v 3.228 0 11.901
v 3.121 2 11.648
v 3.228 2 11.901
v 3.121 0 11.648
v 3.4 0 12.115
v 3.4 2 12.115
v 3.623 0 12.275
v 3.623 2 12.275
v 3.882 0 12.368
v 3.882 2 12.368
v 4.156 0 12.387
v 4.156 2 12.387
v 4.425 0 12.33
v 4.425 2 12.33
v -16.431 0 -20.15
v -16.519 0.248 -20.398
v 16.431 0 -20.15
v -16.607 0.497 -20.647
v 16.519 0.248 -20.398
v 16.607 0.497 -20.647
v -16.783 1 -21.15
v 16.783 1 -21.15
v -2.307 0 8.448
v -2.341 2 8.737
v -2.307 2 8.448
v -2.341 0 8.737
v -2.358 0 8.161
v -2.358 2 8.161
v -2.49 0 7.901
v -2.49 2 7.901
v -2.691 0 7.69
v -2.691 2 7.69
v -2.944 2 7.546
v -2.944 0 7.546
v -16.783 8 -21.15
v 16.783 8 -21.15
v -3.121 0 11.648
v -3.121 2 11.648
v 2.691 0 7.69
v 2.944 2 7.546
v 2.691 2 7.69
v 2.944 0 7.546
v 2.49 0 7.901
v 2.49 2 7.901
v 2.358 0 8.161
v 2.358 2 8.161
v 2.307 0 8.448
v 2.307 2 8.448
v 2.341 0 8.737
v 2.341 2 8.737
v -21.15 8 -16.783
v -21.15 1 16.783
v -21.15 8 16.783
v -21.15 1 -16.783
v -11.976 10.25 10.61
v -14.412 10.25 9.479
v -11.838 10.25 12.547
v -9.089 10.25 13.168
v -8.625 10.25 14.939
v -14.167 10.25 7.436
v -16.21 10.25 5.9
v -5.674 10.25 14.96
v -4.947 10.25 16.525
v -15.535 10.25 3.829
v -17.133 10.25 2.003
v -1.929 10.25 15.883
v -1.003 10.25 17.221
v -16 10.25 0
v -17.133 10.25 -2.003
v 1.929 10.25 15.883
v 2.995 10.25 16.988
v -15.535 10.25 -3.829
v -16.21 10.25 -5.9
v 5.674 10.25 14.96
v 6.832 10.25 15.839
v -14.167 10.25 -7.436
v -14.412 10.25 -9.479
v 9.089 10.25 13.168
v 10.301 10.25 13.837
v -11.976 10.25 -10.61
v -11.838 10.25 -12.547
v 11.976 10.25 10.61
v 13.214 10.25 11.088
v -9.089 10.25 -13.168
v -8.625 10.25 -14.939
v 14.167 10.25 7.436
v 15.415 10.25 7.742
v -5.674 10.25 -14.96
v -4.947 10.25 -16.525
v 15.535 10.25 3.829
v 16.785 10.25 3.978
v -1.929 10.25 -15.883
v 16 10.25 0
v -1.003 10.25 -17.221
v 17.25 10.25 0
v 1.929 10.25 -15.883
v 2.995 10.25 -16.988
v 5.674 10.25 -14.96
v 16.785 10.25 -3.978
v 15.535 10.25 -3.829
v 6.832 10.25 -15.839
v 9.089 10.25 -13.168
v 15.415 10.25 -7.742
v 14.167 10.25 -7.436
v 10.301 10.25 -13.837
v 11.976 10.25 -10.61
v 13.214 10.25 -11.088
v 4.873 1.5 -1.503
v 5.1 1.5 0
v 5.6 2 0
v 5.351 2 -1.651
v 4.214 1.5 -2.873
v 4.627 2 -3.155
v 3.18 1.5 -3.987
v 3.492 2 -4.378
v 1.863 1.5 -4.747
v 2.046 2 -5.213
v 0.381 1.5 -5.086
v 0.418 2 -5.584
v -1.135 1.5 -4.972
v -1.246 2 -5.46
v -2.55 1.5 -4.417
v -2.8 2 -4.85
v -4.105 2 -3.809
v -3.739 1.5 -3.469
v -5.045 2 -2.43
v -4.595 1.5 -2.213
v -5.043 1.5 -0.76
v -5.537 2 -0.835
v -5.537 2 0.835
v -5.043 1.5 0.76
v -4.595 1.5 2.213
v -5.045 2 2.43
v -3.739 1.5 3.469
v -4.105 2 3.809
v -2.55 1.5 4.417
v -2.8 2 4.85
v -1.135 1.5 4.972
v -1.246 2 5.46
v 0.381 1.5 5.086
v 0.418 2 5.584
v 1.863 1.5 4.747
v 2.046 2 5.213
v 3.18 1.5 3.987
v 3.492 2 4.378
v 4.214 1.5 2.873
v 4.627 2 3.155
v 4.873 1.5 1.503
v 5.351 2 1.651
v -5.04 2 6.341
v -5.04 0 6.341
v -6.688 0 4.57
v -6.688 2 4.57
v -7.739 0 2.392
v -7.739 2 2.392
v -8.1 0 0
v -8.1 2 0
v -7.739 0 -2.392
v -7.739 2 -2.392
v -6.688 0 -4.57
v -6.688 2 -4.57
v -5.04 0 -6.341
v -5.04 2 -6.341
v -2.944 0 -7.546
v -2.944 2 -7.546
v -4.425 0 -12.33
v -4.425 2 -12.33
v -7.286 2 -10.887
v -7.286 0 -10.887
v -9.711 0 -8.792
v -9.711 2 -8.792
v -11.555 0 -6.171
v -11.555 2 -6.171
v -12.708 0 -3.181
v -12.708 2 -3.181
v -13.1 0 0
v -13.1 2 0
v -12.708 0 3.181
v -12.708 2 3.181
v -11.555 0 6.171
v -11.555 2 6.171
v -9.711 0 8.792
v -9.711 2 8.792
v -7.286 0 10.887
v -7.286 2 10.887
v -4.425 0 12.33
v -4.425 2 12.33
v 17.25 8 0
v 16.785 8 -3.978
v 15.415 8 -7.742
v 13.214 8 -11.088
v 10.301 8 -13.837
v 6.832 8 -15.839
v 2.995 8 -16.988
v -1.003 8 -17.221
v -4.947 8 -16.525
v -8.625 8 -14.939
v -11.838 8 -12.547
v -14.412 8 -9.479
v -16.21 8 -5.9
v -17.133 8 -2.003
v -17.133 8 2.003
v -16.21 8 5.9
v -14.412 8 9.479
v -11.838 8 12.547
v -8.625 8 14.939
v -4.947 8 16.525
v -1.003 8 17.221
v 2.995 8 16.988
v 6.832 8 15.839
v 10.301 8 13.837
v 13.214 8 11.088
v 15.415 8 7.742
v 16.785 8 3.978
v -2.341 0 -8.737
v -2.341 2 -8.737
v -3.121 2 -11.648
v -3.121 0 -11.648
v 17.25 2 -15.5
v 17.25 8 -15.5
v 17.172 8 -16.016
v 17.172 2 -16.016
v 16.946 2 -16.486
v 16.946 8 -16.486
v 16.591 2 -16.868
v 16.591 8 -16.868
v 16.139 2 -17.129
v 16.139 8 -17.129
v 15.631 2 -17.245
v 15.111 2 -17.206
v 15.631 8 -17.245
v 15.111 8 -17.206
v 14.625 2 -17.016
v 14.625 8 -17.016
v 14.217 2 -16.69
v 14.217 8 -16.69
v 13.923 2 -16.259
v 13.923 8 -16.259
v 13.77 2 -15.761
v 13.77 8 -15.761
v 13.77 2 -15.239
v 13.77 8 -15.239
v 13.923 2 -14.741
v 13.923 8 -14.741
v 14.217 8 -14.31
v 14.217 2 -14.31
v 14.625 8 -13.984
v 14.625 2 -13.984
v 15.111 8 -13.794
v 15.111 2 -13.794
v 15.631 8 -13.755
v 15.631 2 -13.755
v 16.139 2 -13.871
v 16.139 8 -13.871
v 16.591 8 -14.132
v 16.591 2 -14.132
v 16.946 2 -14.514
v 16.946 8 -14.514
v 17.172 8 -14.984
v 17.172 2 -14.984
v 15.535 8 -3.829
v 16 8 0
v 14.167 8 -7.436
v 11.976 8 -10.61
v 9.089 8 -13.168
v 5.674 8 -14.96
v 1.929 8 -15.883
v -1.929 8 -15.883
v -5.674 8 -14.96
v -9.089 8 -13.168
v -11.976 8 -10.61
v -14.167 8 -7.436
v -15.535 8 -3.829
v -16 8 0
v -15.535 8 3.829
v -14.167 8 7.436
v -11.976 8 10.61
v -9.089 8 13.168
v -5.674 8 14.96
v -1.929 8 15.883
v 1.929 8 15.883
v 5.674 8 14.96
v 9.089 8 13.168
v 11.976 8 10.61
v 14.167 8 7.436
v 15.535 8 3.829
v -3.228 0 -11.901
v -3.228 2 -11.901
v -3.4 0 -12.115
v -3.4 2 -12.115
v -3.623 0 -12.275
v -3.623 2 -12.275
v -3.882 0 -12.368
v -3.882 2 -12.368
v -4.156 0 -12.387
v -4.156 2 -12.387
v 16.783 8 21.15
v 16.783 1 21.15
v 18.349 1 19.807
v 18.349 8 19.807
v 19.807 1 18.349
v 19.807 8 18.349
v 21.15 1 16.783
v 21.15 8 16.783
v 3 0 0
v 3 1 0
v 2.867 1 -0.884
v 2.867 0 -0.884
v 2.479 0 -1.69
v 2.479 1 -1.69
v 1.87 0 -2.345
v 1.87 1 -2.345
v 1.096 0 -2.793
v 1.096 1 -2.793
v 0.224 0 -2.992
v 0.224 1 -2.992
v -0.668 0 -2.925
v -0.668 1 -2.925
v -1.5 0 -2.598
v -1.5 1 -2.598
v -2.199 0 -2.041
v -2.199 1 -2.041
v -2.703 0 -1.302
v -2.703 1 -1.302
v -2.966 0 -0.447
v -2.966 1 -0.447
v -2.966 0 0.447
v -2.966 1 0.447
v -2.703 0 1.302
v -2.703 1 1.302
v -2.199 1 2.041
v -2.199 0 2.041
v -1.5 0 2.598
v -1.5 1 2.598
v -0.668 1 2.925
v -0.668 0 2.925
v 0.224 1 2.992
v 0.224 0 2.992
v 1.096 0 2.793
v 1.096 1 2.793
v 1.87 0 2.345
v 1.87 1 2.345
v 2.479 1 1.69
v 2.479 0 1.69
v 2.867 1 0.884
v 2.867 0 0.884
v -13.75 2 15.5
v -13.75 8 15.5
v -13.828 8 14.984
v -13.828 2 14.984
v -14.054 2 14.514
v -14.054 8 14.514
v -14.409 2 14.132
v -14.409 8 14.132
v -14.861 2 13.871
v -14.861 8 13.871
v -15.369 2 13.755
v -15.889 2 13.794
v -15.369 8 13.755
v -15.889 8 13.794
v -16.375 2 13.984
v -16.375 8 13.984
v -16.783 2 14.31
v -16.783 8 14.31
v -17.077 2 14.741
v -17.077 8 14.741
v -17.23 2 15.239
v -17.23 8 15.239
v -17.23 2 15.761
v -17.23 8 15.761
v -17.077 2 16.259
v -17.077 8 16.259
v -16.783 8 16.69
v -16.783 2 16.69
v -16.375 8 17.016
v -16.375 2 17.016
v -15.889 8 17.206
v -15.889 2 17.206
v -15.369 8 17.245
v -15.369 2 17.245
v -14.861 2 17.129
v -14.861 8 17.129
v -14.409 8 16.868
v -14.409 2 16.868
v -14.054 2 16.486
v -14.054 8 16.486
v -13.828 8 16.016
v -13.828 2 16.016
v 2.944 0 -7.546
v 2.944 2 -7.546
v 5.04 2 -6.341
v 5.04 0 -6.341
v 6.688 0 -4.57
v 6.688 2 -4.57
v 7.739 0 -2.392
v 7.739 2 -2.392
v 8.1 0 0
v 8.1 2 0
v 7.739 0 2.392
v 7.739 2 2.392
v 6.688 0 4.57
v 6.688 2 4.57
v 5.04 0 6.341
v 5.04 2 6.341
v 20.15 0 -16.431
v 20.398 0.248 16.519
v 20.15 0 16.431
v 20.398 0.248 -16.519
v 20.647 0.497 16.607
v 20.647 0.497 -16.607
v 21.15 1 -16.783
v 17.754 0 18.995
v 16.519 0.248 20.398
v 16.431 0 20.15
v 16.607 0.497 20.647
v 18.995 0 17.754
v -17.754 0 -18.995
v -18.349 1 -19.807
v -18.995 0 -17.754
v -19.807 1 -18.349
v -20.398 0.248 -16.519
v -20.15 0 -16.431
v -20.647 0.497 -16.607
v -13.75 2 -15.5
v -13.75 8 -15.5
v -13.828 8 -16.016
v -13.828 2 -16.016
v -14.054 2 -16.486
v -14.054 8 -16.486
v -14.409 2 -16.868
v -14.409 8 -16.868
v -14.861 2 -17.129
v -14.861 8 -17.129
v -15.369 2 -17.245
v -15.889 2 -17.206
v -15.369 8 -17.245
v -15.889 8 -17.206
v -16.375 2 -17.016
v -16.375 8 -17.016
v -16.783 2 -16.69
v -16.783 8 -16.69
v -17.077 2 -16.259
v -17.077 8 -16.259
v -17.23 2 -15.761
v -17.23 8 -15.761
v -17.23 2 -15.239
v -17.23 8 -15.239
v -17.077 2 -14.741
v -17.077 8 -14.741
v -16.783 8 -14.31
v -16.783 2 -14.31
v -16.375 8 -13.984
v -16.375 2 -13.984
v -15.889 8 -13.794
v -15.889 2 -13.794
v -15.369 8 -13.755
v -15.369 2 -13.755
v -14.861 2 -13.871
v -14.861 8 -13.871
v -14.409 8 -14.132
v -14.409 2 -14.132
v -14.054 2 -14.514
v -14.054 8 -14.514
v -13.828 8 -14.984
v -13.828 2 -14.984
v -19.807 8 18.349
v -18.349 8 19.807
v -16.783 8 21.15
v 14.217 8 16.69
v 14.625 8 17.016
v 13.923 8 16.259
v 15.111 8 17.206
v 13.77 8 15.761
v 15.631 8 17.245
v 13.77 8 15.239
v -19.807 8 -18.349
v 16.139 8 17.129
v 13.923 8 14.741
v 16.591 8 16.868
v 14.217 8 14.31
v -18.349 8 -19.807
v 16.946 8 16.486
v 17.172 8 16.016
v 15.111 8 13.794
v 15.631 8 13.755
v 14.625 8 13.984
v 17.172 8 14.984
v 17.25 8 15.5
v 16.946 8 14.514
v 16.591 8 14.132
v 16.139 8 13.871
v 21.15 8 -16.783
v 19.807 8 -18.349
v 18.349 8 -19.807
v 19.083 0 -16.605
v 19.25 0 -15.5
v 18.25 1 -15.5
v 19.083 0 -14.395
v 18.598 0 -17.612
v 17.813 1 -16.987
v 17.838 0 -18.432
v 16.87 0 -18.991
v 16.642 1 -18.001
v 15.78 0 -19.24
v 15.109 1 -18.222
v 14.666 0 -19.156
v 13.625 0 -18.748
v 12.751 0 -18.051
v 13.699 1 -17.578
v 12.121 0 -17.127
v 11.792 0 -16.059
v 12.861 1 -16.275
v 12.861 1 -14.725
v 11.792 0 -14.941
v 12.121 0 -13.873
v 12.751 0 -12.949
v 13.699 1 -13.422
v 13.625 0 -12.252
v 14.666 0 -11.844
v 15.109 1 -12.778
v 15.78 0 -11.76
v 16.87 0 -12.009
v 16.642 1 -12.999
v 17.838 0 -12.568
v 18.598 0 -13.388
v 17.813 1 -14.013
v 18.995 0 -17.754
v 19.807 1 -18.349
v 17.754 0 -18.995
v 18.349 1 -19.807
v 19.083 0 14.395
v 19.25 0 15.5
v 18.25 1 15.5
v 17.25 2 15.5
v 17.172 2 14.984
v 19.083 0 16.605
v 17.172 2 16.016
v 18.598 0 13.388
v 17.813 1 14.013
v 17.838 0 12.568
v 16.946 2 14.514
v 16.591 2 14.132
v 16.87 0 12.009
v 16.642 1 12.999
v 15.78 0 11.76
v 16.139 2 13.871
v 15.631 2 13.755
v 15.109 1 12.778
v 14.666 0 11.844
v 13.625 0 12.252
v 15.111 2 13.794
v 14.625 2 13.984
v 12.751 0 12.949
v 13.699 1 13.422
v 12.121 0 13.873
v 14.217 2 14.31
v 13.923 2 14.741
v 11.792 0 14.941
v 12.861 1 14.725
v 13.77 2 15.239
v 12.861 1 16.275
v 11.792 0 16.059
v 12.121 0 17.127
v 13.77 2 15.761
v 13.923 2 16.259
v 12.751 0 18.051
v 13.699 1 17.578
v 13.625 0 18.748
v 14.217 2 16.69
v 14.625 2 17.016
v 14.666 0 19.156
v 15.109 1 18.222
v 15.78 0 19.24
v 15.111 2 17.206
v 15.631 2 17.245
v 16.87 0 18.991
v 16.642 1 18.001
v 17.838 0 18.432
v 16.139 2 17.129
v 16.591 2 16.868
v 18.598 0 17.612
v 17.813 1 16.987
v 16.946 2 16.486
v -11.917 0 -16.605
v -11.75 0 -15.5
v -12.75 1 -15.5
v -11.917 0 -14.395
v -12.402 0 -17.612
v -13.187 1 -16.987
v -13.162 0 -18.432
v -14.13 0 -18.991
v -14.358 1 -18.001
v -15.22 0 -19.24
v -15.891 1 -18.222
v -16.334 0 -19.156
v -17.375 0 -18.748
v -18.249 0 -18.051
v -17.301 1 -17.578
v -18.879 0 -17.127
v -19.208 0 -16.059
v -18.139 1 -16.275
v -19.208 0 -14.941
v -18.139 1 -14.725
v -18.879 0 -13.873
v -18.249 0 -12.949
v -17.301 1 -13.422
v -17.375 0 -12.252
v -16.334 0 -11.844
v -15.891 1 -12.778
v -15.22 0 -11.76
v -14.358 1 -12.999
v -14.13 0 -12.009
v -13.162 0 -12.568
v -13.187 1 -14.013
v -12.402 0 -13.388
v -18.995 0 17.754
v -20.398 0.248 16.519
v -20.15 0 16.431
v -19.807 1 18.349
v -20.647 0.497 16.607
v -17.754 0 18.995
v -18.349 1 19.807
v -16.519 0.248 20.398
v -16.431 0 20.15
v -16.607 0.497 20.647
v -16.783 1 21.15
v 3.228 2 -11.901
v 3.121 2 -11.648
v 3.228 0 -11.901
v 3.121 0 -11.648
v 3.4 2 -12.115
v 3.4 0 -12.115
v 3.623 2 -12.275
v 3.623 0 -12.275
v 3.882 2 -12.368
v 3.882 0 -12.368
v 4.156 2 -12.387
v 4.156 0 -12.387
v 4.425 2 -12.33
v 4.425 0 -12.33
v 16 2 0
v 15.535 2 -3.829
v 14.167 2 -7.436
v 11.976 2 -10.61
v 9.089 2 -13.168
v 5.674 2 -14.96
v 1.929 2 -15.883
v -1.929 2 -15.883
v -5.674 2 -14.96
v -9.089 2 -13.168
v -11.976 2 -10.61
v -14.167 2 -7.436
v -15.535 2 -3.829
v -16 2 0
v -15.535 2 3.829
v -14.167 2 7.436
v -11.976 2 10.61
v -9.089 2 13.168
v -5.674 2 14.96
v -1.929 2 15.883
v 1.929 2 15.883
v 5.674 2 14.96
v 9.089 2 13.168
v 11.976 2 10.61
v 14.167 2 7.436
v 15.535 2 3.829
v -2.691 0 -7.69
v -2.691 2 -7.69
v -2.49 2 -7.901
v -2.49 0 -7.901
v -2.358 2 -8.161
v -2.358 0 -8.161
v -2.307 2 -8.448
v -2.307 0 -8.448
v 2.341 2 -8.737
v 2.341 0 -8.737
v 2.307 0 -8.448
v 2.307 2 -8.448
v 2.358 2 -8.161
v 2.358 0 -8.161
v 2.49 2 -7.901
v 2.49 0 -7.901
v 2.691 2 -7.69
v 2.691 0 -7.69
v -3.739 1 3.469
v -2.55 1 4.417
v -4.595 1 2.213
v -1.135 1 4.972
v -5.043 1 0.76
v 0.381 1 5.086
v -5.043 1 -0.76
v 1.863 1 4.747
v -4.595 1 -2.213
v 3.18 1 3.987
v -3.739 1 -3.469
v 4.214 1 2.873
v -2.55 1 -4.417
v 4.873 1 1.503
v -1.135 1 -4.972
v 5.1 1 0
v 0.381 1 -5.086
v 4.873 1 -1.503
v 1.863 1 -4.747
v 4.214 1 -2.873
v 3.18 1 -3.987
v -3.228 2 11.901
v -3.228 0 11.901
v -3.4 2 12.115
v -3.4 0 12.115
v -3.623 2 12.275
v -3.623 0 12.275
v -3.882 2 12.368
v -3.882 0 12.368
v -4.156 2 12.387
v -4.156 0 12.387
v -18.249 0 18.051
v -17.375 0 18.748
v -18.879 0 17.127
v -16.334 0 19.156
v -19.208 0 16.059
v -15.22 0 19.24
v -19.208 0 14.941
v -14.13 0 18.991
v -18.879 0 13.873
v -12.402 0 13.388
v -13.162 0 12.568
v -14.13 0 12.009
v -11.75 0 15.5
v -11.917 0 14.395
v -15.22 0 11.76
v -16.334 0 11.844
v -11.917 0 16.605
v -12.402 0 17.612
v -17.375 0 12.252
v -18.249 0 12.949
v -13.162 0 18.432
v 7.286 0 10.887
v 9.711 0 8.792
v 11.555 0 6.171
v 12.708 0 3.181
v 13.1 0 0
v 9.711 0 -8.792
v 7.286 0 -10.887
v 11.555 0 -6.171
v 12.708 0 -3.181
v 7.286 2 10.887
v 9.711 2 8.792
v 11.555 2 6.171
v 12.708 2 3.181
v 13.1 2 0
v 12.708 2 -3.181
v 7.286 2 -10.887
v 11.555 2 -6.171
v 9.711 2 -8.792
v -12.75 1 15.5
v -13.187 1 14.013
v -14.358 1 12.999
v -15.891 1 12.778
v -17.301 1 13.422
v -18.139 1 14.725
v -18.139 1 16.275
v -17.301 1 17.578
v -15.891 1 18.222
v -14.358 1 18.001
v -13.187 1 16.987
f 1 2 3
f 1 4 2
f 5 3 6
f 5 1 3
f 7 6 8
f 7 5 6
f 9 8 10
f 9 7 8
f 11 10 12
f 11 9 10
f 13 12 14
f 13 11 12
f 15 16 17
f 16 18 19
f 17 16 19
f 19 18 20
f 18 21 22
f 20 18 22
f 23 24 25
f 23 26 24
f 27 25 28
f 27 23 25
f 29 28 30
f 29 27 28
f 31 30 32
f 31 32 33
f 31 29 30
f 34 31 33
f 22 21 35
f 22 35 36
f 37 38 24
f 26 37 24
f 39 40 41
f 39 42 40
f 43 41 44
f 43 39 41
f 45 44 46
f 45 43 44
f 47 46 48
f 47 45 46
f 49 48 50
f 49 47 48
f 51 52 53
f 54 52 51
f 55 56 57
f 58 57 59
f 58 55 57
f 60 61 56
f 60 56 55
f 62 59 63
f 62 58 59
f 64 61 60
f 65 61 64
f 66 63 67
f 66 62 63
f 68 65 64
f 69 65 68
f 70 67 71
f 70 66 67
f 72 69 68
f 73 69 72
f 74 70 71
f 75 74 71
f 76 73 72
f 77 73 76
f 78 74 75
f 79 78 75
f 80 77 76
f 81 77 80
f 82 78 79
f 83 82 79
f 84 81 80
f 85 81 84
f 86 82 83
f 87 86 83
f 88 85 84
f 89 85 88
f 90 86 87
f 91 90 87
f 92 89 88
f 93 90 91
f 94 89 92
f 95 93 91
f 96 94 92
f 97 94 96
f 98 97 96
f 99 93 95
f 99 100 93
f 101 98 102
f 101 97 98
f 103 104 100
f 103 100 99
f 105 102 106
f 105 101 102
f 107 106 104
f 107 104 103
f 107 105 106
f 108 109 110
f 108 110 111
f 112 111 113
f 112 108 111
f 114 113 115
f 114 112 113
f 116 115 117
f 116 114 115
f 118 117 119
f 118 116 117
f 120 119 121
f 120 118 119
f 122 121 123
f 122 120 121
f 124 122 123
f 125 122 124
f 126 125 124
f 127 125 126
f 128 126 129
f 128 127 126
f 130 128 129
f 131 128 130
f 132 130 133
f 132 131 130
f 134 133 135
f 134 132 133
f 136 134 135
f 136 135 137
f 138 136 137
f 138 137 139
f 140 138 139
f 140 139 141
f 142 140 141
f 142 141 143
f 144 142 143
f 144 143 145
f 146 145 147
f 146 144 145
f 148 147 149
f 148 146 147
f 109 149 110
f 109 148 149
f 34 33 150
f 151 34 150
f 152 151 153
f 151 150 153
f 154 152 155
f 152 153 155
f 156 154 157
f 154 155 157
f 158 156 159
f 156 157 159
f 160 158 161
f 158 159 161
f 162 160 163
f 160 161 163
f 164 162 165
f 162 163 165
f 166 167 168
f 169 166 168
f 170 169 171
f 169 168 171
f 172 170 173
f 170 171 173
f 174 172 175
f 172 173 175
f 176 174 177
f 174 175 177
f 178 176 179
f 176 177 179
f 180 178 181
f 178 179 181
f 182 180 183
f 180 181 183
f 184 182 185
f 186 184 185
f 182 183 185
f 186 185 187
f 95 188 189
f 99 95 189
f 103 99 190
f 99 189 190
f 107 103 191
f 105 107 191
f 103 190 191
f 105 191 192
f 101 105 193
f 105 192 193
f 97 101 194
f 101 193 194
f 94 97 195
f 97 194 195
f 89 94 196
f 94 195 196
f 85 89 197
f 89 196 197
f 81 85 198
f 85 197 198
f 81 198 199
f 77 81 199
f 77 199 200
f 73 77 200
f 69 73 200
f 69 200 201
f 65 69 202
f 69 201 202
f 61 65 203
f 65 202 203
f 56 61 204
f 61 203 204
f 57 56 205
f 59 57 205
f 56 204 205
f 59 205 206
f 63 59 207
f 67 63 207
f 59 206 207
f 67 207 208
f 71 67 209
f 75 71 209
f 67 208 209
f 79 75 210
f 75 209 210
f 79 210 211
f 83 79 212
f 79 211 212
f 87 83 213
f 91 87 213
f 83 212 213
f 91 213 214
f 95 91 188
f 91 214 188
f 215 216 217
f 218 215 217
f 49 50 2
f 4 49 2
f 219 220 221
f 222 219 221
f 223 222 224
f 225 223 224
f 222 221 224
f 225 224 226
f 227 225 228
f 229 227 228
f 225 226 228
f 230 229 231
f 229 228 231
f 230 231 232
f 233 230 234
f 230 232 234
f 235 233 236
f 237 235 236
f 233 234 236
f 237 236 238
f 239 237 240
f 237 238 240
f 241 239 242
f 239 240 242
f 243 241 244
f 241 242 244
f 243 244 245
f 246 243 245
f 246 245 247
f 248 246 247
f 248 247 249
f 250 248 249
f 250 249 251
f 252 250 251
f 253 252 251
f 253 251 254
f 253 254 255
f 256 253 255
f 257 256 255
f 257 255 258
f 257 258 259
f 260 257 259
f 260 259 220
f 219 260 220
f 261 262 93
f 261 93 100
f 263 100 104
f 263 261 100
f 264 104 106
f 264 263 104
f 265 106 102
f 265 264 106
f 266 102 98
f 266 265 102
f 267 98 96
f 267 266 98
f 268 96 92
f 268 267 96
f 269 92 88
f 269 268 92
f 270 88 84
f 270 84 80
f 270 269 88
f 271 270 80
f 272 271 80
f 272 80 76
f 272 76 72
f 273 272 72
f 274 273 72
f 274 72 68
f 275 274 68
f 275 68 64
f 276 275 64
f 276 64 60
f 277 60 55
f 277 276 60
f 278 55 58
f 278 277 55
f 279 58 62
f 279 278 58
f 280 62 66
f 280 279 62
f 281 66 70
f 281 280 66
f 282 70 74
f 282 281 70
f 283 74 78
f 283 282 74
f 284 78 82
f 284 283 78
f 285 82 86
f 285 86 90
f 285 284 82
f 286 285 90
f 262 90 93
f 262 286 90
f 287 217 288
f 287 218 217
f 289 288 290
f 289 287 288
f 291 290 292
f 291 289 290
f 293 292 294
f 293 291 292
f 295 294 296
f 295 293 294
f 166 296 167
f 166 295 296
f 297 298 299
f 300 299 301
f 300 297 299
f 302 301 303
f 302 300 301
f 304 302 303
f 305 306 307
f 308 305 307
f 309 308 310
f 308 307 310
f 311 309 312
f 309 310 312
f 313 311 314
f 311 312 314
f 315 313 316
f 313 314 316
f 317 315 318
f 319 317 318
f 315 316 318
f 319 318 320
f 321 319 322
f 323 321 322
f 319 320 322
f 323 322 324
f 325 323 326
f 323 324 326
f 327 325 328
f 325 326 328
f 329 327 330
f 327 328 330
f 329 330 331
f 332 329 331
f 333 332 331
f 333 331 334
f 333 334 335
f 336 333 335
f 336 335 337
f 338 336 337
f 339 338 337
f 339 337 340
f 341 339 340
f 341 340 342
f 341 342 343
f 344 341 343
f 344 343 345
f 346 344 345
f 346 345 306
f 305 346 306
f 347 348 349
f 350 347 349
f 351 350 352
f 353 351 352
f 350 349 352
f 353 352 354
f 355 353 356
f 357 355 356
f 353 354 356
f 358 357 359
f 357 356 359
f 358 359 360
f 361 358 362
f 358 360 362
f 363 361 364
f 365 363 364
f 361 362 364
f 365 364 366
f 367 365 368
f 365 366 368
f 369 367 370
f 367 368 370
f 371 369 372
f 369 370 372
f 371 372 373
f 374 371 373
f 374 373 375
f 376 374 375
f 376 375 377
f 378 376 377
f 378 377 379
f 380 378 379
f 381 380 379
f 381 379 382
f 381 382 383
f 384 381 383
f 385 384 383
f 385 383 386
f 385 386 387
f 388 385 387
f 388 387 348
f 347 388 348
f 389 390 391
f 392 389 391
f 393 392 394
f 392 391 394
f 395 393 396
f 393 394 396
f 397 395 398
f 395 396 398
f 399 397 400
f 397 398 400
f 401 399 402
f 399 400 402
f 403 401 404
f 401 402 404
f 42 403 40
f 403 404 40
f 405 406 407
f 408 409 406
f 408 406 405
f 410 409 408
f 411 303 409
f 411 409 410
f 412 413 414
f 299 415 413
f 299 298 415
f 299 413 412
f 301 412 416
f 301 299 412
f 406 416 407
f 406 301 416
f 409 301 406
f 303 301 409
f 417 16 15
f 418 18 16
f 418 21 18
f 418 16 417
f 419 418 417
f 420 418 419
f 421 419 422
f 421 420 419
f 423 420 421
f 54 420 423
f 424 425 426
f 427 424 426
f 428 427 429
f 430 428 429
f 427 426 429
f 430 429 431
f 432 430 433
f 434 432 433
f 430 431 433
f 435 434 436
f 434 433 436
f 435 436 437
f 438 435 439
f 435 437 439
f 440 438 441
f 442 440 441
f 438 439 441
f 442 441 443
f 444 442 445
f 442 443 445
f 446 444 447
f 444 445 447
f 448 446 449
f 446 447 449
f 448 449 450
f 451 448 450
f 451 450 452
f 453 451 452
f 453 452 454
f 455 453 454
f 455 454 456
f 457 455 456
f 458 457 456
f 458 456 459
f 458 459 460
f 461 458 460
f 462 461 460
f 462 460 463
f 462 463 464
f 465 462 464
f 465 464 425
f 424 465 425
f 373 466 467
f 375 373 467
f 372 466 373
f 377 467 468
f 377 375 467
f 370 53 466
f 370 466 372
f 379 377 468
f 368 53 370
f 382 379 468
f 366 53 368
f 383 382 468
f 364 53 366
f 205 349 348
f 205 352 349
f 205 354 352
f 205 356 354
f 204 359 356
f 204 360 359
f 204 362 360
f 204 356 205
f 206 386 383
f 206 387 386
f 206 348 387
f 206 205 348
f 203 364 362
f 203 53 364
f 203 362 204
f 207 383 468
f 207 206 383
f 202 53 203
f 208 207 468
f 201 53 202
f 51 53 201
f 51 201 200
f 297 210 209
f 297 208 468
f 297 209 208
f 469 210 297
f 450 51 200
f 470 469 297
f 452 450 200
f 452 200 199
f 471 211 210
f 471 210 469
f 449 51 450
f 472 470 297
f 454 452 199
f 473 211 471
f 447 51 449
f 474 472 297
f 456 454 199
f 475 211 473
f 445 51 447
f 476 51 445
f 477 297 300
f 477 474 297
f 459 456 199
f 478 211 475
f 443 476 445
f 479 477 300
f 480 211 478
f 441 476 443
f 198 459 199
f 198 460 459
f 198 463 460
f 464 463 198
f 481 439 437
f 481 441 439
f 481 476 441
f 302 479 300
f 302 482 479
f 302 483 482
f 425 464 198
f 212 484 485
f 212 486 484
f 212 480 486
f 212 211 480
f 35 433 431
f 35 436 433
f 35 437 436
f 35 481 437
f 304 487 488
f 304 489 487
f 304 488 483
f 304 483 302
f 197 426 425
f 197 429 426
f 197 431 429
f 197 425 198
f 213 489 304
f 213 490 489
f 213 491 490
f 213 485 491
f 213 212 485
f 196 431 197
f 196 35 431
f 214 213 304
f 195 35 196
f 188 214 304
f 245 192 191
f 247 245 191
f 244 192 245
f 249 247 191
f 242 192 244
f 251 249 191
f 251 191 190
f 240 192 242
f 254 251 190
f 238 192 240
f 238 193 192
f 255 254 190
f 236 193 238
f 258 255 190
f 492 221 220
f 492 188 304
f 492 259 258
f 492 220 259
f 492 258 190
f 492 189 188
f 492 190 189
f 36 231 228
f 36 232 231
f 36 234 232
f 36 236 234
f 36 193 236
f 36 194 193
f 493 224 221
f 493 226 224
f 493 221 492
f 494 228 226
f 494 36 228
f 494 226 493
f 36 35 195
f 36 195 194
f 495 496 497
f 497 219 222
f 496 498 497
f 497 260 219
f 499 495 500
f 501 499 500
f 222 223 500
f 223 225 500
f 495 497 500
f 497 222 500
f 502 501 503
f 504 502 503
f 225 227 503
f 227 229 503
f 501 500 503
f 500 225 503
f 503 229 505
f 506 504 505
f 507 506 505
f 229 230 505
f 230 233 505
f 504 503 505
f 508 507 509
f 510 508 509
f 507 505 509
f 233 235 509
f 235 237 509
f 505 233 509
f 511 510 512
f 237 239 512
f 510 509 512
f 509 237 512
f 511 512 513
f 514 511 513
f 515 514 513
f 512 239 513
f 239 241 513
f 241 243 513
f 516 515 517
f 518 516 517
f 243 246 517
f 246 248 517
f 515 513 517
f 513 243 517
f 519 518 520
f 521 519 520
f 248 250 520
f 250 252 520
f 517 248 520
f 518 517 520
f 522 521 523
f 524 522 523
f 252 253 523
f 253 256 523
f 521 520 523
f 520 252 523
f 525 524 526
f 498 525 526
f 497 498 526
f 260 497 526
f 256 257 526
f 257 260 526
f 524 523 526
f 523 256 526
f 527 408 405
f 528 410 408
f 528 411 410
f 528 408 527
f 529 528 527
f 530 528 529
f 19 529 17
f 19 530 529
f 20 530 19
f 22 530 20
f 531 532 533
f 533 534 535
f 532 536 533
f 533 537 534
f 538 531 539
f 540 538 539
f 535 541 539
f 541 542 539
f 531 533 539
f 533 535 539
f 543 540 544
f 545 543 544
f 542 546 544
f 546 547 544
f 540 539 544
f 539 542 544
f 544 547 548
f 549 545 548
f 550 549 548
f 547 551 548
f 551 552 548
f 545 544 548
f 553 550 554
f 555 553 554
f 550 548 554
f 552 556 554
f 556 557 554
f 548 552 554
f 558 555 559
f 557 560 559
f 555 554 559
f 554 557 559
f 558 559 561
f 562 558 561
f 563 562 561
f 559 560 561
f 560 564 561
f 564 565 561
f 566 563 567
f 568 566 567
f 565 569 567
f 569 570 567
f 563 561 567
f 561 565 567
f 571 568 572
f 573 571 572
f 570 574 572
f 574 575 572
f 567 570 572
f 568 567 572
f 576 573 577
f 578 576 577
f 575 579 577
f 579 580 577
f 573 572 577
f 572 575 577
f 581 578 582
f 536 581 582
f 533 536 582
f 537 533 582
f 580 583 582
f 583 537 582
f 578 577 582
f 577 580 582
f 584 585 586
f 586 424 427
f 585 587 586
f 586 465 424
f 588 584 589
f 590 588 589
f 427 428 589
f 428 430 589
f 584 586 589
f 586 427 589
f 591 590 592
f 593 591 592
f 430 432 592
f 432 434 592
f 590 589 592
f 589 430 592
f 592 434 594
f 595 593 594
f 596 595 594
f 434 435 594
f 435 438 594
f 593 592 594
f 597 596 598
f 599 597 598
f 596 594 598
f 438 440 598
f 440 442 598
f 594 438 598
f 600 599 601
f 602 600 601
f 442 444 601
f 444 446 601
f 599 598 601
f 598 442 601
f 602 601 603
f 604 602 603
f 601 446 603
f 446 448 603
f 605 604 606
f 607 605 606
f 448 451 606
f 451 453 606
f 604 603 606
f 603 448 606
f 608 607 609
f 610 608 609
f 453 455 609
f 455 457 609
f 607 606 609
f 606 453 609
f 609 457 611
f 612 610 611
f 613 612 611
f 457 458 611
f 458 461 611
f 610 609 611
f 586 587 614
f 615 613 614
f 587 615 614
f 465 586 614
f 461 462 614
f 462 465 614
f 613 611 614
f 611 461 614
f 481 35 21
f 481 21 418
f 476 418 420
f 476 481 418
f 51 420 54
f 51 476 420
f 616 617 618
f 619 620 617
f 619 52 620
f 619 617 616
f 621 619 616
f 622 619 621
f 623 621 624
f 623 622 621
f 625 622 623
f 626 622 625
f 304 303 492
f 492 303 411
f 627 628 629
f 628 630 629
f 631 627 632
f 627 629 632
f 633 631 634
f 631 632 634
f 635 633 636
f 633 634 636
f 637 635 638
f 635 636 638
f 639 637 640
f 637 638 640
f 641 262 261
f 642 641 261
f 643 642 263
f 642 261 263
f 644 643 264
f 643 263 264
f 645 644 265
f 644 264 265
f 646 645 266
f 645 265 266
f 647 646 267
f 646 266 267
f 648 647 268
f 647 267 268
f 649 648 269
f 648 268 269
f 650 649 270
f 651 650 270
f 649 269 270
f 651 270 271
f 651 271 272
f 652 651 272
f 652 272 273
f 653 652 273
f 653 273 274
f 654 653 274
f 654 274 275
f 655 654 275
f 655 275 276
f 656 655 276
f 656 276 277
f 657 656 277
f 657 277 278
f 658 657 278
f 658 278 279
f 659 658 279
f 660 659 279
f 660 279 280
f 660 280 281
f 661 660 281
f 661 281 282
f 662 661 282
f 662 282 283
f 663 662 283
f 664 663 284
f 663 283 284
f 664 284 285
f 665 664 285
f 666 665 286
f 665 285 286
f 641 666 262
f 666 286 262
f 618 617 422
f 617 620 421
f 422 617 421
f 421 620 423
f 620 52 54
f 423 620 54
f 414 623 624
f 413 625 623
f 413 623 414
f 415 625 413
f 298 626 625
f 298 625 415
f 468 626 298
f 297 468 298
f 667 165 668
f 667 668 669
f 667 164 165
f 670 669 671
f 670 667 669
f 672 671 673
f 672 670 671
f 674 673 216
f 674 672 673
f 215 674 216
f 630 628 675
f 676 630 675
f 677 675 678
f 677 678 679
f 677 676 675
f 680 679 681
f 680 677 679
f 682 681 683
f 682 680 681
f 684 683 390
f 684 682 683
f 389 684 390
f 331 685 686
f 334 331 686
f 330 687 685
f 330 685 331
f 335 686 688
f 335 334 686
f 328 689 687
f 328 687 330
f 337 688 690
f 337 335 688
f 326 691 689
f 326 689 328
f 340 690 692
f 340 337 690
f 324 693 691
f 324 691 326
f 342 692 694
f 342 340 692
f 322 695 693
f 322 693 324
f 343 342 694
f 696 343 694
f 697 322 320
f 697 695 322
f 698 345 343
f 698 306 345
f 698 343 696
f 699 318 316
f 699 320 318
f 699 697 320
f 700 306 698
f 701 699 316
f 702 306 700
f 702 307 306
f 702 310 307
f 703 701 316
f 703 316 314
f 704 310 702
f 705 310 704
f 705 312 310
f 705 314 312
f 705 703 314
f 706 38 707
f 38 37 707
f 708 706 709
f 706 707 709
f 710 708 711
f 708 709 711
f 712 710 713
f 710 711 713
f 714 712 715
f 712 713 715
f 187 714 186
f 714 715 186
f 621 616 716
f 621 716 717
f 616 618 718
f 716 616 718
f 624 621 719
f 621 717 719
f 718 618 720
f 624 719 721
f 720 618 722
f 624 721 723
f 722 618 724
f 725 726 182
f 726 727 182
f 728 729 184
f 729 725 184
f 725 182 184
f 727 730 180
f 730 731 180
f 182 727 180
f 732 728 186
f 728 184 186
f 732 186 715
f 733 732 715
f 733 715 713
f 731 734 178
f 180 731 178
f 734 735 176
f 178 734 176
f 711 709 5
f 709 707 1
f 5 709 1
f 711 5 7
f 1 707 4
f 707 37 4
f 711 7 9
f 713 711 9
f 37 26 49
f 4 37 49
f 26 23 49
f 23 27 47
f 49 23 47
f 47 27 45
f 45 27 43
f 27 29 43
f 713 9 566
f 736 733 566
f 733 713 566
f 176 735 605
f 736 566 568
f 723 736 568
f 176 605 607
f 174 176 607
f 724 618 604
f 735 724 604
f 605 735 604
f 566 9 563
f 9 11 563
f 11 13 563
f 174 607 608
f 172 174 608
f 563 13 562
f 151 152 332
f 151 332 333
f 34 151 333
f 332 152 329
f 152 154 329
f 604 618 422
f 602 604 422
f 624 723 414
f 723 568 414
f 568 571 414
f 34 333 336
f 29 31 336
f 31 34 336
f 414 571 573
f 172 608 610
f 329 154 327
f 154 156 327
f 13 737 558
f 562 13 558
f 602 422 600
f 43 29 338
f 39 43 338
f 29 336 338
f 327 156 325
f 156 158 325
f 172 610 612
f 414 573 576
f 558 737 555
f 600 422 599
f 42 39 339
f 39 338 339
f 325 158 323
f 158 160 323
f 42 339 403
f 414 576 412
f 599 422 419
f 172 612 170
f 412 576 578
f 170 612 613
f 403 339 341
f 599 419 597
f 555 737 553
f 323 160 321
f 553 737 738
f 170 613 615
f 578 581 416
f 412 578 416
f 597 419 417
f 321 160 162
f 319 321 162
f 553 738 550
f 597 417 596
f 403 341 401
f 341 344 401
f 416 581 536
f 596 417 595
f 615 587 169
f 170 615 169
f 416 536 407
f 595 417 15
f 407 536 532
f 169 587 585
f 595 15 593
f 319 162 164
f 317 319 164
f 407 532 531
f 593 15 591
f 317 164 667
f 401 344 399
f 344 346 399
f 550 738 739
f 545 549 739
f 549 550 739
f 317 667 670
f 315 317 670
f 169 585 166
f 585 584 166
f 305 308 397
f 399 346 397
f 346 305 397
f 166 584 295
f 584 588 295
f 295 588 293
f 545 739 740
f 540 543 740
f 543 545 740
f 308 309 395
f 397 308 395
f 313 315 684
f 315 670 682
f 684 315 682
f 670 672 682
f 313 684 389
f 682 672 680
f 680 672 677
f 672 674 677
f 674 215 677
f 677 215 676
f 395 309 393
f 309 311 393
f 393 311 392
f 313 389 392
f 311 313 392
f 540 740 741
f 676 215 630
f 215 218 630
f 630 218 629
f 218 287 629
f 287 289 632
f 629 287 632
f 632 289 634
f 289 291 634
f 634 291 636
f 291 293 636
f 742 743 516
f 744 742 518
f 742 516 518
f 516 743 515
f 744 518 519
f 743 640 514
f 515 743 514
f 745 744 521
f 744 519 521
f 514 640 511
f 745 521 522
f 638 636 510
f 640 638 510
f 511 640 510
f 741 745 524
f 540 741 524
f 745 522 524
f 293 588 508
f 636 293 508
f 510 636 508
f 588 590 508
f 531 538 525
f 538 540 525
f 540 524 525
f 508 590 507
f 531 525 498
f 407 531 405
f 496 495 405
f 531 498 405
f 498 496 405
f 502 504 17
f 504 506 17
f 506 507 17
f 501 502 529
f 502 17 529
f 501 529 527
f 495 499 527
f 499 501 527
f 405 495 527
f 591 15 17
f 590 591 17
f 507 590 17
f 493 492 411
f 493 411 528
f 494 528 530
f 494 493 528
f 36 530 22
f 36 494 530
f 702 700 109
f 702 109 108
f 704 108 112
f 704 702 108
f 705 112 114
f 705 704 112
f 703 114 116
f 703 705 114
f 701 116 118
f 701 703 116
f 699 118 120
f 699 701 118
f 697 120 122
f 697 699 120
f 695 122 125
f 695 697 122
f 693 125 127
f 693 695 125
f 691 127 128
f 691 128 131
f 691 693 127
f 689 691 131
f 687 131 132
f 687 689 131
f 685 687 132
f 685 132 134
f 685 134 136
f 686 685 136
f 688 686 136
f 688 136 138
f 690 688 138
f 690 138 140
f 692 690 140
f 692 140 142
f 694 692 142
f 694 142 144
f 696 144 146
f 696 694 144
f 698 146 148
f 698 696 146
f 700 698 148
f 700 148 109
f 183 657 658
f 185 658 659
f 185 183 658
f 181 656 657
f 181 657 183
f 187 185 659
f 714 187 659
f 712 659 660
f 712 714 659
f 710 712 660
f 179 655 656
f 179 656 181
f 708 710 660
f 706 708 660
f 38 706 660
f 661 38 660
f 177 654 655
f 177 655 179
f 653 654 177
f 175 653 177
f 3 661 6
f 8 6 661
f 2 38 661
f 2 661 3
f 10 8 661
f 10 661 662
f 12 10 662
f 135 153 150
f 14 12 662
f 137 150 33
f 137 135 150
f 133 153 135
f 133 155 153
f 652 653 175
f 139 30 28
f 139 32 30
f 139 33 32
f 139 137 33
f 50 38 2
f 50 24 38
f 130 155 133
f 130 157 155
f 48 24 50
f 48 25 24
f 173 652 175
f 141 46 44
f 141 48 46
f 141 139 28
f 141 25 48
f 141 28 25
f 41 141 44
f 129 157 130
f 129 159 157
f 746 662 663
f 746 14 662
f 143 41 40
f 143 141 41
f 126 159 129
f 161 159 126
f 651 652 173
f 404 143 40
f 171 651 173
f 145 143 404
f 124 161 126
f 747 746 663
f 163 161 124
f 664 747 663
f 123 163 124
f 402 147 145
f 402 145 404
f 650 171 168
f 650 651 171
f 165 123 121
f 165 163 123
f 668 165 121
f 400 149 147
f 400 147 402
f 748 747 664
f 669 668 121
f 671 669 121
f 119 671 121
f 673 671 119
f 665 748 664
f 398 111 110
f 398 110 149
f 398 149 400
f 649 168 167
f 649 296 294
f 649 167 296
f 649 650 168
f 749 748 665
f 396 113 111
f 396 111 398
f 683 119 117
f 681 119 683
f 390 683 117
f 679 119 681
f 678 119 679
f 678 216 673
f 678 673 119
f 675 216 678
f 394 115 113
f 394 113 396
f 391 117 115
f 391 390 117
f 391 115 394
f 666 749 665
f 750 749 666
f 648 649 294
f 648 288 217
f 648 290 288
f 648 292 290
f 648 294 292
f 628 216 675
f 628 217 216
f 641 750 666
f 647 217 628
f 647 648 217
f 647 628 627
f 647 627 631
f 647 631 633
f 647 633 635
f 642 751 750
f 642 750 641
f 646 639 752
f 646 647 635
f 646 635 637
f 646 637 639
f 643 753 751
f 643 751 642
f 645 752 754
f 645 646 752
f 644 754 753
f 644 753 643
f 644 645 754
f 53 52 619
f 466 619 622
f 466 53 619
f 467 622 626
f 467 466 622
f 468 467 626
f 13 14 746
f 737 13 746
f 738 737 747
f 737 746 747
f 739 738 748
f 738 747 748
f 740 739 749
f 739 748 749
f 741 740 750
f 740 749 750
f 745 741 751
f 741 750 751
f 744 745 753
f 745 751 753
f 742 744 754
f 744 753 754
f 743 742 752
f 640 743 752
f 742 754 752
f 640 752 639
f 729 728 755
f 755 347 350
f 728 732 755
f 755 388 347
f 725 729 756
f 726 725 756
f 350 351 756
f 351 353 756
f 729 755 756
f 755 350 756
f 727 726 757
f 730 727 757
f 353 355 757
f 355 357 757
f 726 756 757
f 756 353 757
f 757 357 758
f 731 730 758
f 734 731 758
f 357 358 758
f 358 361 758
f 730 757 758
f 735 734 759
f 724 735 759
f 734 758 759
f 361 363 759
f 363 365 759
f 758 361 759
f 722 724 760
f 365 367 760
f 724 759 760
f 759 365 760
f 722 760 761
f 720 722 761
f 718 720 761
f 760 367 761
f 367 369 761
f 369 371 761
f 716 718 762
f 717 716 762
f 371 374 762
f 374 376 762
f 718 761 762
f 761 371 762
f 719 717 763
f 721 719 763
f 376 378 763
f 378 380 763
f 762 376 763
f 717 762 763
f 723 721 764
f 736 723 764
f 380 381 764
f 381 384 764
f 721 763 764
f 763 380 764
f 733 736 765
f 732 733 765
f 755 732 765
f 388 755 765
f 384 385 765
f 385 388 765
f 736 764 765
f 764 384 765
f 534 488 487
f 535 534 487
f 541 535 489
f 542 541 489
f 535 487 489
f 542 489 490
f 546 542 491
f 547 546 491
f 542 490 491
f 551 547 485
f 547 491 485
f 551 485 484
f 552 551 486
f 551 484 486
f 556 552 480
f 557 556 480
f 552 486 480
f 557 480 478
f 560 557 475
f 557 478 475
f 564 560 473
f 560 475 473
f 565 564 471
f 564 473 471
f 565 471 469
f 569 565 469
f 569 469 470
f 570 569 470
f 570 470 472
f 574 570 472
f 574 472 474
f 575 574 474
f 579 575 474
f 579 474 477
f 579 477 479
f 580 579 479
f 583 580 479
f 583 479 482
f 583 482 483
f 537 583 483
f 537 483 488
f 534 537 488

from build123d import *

# Parameters (mm, degrees)
SKETCH2_W           = 42.3
SKETCH2_H           = 42.3
BOSS_EXTRUDE1_DEPTH = 8
SKETCH5_R           = 29.910616844
SKETCH5_R_2         = 27
CUT_EXTRUDE4_DEPTH  = 9
SKETCH6_R           = 16
CUT_EXTRUDE7_DEPTH  = 7
SKETCH8_R           = 16
SKETCH8_R_2         = 5.1
BOSS_EXTRUDE3_DEPTH = 1
CUT_EXTRUDE8_DEPTH  = 3
FILLET1_R           = 1
SKETCH10_R          = 3
CUT_EXTRUDE9_DEPTH  = 2
SKETCH7_R           = 1.75
CUT_EXTRUDE6_DEPTH  = 9
CHAMFER4_SIZE       = 1
CHAMFER5_SIZE       = 2
CHAMFER6_SIZE       = 0.5
SKETCH11_R          = 17.25
SKETCH11_R_2        = 16
BOSS_EXTRUDE4_DEPTH = 2.25


with BuildPart() as part:
    # Sketch2 → Boss-Extrude1 (new body)
    with BuildSketch(Plane(origin=(0, 0, 0), x_dir=(1, 0, 0), z_dir=(0, 1, 0))):
        Rectangle(SKETCH2_W, SKETCH2_H)
    extrude(amount=BOSS_EXTRUDE1_DEPTH)

    # Sketch5 → Cut-Extrude4 (cut, through all)
    with BuildSketch(Plane(origin=(0, 8, 0), x_dir=(1, 0, 0), z_dir=(0, 1, 0))):
        Circle(SKETCH5_R)
        Circle(SKETCH5_R_2, mode=Mode.SUBTRACT)
    extrude(amount=-CUT_EXTRUDE4_DEPTH, mode=Mode.SUBTRACT)

    # Sketch6 → Cut-Extrude7 (cut)
    with BuildSketch(Plane(origin=(0, 8, 0), x_dir=(1, 0, 0), z_dir=(0, 1, 0))):
        Circle(SKETCH6_R)
    extrude(amount=-CUT_EXTRUDE7_DEPTH, mode=Mode.SUBTRACT)

    # Sketch8 → Boss-Extrude3 (add)
    with BuildSketch(Plane(origin=(0, 1, 0), x_dir=(1, 0, 0), z_dir=(0, 1, 0))):
        Circle(SKETCH8_R)
        Circle(SKETCH8_R_2, mode=Mode.SUBTRACT)
    extrude(amount=BOSS_EXTRUDE3_DEPTH)

    # Sketch9 → Cut-Extrude8 (cut, through all)
    with BuildSketch(Plane(origin=(0, 2, 0), x_dir=(1, 0, 0), z_dir=(0, 1, 0))):
        with BuildLine():
            Line((3.390529491, 12.653628324), (2.096434265, 7.823999193))
            ThreePointArc((2.096434265, 7.823999193), (8.1, 0), (2.096434265, -7.823999193))
            Line((2.096434265, -7.823999193), (3.390529491, -12.653628324))
            ThreePointArc((3.390529491, -12.653628324), (13.1, 0), (3.390529491, 12.653628324))
        make_face()
        with BuildLine():
            Line((-3.390529491, -12.653628324), (-2.096434265, -7.823999193))
            ThreePointArc((-2.096434265, -7.823999193), (-8.1, 0), (-2.096434265, 7.823999193))
            Line((-2.096434265, 7.823999193), (-3.390529491, 12.653628324))
            ThreePointArc((-3.390529491, 12.653628324), (-13.1, 0), (-3.390529491, -12.653628324))
        make_face()
    extrude(amount=-CUT_EXTRUDE8_DEPTH, mode=Mode.SUBTRACT)

    # Fillet1
    fillet1_edges = [part.edges().sort_by_distance(p)[0] for p in [
        (3.390529491, 1, -12.653628324),
        (3.390529491, 1, 12.653628324),
        (2.096434265, 1, 7.823999193),
        (2.096434265, 1, -7.823999193),
        (-2.096434265, 1, -7.823999193),
        (-2.096434265, 1, 7.823999193),
        (-3.390529491, 1, 12.653628324),
        (-3.390529491, 1, -12.653628324),
    ]]
    fillet(fillet1_edges, radius=FILLET1_R)

    # Sketch10 → Cut-Extrude9 (cut, through all)
    with BuildSketch(Plane(origin=(0, 1, 0), x_dir=(1, 0, 0), z_dir=(0, 1, 0))):
        Circle(SKETCH10_R)
    extrude(amount=-CUT_EXTRUDE9_DEPTH, mode=Mode.SUBTRACT)

    # Sketch7 → Cut-Extrude6 (cut, through all)
    with BuildSketch(Plane(origin=(0, 8, 0), x_dir=(1, 0, 0), z_dir=(0, 1, 0))):
        with Locations((-15.5, 15.5)):
            Circle(SKETCH7_R)
        with Locations((15.5, 15.5)):
            Circle(SKETCH7_R)
        with Locations((15.5, -15.5)):
            Circle(SKETCH7_R)
        with Locations((-15.5, -15.5)):
            Circle(SKETCH7_R)
    extrude(amount=-CUT_EXTRUDE6_DEPTH, mode=Mode.SUBTRACT)

    # Chamfer4
    chamfer4_edges = [part.edges().sort_by_distance(p)[0] for p in [
        (21.15, 0, 0),
        (0, 0, 21.15),
        (-21.15, 0, 0),
        (0, 0, -21.15),
        (-19.091883092, 0, 19.091883092),
        (-19.091883092, 0, -19.091883092),
        (19.091883092, 0, -19.091883092),
        (19.091883092, 0, 19.091883092),
    ]]
    chamfer(chamfer4_edges, length=CHAMFER4_SIZE)

    # Chamfer5
    chamfer5_edges = [part.edges().sort_by_distance(p)[0] for p in [
        (-17.25, 0, 15.5),
        (13.75, 0, 15.5),
        (13.75, 0, -15.5),
        (-17.25, 0, -15.5),
    ]]
    chamfer(chamfer5_edges, length=CHAMFER5_SIZE)

    # Chamfer6
    chamfer6_edges = [part.edges().sort_by_distance(p)[0] for p in [
        (-5.1, 2, 0),
    ]]
    chamfer(chamfer6_edges, length=CHAMFER6_SIZE)

    # Sketch11 → Boss-Extrude4 (add)
    with BuildSketch(Plane(origin=(0, 8, 0), x_dir=(1, 0, 0), z_dir=(0, 1, 0))):
        Circle(SKETCH11_R)
        Circle(SKETCH11_R_2, mode=Mode.SUBTRACT)
    extrude(amount=BOSS_EXTRUDE4_DEPTH)


solid = part.part
